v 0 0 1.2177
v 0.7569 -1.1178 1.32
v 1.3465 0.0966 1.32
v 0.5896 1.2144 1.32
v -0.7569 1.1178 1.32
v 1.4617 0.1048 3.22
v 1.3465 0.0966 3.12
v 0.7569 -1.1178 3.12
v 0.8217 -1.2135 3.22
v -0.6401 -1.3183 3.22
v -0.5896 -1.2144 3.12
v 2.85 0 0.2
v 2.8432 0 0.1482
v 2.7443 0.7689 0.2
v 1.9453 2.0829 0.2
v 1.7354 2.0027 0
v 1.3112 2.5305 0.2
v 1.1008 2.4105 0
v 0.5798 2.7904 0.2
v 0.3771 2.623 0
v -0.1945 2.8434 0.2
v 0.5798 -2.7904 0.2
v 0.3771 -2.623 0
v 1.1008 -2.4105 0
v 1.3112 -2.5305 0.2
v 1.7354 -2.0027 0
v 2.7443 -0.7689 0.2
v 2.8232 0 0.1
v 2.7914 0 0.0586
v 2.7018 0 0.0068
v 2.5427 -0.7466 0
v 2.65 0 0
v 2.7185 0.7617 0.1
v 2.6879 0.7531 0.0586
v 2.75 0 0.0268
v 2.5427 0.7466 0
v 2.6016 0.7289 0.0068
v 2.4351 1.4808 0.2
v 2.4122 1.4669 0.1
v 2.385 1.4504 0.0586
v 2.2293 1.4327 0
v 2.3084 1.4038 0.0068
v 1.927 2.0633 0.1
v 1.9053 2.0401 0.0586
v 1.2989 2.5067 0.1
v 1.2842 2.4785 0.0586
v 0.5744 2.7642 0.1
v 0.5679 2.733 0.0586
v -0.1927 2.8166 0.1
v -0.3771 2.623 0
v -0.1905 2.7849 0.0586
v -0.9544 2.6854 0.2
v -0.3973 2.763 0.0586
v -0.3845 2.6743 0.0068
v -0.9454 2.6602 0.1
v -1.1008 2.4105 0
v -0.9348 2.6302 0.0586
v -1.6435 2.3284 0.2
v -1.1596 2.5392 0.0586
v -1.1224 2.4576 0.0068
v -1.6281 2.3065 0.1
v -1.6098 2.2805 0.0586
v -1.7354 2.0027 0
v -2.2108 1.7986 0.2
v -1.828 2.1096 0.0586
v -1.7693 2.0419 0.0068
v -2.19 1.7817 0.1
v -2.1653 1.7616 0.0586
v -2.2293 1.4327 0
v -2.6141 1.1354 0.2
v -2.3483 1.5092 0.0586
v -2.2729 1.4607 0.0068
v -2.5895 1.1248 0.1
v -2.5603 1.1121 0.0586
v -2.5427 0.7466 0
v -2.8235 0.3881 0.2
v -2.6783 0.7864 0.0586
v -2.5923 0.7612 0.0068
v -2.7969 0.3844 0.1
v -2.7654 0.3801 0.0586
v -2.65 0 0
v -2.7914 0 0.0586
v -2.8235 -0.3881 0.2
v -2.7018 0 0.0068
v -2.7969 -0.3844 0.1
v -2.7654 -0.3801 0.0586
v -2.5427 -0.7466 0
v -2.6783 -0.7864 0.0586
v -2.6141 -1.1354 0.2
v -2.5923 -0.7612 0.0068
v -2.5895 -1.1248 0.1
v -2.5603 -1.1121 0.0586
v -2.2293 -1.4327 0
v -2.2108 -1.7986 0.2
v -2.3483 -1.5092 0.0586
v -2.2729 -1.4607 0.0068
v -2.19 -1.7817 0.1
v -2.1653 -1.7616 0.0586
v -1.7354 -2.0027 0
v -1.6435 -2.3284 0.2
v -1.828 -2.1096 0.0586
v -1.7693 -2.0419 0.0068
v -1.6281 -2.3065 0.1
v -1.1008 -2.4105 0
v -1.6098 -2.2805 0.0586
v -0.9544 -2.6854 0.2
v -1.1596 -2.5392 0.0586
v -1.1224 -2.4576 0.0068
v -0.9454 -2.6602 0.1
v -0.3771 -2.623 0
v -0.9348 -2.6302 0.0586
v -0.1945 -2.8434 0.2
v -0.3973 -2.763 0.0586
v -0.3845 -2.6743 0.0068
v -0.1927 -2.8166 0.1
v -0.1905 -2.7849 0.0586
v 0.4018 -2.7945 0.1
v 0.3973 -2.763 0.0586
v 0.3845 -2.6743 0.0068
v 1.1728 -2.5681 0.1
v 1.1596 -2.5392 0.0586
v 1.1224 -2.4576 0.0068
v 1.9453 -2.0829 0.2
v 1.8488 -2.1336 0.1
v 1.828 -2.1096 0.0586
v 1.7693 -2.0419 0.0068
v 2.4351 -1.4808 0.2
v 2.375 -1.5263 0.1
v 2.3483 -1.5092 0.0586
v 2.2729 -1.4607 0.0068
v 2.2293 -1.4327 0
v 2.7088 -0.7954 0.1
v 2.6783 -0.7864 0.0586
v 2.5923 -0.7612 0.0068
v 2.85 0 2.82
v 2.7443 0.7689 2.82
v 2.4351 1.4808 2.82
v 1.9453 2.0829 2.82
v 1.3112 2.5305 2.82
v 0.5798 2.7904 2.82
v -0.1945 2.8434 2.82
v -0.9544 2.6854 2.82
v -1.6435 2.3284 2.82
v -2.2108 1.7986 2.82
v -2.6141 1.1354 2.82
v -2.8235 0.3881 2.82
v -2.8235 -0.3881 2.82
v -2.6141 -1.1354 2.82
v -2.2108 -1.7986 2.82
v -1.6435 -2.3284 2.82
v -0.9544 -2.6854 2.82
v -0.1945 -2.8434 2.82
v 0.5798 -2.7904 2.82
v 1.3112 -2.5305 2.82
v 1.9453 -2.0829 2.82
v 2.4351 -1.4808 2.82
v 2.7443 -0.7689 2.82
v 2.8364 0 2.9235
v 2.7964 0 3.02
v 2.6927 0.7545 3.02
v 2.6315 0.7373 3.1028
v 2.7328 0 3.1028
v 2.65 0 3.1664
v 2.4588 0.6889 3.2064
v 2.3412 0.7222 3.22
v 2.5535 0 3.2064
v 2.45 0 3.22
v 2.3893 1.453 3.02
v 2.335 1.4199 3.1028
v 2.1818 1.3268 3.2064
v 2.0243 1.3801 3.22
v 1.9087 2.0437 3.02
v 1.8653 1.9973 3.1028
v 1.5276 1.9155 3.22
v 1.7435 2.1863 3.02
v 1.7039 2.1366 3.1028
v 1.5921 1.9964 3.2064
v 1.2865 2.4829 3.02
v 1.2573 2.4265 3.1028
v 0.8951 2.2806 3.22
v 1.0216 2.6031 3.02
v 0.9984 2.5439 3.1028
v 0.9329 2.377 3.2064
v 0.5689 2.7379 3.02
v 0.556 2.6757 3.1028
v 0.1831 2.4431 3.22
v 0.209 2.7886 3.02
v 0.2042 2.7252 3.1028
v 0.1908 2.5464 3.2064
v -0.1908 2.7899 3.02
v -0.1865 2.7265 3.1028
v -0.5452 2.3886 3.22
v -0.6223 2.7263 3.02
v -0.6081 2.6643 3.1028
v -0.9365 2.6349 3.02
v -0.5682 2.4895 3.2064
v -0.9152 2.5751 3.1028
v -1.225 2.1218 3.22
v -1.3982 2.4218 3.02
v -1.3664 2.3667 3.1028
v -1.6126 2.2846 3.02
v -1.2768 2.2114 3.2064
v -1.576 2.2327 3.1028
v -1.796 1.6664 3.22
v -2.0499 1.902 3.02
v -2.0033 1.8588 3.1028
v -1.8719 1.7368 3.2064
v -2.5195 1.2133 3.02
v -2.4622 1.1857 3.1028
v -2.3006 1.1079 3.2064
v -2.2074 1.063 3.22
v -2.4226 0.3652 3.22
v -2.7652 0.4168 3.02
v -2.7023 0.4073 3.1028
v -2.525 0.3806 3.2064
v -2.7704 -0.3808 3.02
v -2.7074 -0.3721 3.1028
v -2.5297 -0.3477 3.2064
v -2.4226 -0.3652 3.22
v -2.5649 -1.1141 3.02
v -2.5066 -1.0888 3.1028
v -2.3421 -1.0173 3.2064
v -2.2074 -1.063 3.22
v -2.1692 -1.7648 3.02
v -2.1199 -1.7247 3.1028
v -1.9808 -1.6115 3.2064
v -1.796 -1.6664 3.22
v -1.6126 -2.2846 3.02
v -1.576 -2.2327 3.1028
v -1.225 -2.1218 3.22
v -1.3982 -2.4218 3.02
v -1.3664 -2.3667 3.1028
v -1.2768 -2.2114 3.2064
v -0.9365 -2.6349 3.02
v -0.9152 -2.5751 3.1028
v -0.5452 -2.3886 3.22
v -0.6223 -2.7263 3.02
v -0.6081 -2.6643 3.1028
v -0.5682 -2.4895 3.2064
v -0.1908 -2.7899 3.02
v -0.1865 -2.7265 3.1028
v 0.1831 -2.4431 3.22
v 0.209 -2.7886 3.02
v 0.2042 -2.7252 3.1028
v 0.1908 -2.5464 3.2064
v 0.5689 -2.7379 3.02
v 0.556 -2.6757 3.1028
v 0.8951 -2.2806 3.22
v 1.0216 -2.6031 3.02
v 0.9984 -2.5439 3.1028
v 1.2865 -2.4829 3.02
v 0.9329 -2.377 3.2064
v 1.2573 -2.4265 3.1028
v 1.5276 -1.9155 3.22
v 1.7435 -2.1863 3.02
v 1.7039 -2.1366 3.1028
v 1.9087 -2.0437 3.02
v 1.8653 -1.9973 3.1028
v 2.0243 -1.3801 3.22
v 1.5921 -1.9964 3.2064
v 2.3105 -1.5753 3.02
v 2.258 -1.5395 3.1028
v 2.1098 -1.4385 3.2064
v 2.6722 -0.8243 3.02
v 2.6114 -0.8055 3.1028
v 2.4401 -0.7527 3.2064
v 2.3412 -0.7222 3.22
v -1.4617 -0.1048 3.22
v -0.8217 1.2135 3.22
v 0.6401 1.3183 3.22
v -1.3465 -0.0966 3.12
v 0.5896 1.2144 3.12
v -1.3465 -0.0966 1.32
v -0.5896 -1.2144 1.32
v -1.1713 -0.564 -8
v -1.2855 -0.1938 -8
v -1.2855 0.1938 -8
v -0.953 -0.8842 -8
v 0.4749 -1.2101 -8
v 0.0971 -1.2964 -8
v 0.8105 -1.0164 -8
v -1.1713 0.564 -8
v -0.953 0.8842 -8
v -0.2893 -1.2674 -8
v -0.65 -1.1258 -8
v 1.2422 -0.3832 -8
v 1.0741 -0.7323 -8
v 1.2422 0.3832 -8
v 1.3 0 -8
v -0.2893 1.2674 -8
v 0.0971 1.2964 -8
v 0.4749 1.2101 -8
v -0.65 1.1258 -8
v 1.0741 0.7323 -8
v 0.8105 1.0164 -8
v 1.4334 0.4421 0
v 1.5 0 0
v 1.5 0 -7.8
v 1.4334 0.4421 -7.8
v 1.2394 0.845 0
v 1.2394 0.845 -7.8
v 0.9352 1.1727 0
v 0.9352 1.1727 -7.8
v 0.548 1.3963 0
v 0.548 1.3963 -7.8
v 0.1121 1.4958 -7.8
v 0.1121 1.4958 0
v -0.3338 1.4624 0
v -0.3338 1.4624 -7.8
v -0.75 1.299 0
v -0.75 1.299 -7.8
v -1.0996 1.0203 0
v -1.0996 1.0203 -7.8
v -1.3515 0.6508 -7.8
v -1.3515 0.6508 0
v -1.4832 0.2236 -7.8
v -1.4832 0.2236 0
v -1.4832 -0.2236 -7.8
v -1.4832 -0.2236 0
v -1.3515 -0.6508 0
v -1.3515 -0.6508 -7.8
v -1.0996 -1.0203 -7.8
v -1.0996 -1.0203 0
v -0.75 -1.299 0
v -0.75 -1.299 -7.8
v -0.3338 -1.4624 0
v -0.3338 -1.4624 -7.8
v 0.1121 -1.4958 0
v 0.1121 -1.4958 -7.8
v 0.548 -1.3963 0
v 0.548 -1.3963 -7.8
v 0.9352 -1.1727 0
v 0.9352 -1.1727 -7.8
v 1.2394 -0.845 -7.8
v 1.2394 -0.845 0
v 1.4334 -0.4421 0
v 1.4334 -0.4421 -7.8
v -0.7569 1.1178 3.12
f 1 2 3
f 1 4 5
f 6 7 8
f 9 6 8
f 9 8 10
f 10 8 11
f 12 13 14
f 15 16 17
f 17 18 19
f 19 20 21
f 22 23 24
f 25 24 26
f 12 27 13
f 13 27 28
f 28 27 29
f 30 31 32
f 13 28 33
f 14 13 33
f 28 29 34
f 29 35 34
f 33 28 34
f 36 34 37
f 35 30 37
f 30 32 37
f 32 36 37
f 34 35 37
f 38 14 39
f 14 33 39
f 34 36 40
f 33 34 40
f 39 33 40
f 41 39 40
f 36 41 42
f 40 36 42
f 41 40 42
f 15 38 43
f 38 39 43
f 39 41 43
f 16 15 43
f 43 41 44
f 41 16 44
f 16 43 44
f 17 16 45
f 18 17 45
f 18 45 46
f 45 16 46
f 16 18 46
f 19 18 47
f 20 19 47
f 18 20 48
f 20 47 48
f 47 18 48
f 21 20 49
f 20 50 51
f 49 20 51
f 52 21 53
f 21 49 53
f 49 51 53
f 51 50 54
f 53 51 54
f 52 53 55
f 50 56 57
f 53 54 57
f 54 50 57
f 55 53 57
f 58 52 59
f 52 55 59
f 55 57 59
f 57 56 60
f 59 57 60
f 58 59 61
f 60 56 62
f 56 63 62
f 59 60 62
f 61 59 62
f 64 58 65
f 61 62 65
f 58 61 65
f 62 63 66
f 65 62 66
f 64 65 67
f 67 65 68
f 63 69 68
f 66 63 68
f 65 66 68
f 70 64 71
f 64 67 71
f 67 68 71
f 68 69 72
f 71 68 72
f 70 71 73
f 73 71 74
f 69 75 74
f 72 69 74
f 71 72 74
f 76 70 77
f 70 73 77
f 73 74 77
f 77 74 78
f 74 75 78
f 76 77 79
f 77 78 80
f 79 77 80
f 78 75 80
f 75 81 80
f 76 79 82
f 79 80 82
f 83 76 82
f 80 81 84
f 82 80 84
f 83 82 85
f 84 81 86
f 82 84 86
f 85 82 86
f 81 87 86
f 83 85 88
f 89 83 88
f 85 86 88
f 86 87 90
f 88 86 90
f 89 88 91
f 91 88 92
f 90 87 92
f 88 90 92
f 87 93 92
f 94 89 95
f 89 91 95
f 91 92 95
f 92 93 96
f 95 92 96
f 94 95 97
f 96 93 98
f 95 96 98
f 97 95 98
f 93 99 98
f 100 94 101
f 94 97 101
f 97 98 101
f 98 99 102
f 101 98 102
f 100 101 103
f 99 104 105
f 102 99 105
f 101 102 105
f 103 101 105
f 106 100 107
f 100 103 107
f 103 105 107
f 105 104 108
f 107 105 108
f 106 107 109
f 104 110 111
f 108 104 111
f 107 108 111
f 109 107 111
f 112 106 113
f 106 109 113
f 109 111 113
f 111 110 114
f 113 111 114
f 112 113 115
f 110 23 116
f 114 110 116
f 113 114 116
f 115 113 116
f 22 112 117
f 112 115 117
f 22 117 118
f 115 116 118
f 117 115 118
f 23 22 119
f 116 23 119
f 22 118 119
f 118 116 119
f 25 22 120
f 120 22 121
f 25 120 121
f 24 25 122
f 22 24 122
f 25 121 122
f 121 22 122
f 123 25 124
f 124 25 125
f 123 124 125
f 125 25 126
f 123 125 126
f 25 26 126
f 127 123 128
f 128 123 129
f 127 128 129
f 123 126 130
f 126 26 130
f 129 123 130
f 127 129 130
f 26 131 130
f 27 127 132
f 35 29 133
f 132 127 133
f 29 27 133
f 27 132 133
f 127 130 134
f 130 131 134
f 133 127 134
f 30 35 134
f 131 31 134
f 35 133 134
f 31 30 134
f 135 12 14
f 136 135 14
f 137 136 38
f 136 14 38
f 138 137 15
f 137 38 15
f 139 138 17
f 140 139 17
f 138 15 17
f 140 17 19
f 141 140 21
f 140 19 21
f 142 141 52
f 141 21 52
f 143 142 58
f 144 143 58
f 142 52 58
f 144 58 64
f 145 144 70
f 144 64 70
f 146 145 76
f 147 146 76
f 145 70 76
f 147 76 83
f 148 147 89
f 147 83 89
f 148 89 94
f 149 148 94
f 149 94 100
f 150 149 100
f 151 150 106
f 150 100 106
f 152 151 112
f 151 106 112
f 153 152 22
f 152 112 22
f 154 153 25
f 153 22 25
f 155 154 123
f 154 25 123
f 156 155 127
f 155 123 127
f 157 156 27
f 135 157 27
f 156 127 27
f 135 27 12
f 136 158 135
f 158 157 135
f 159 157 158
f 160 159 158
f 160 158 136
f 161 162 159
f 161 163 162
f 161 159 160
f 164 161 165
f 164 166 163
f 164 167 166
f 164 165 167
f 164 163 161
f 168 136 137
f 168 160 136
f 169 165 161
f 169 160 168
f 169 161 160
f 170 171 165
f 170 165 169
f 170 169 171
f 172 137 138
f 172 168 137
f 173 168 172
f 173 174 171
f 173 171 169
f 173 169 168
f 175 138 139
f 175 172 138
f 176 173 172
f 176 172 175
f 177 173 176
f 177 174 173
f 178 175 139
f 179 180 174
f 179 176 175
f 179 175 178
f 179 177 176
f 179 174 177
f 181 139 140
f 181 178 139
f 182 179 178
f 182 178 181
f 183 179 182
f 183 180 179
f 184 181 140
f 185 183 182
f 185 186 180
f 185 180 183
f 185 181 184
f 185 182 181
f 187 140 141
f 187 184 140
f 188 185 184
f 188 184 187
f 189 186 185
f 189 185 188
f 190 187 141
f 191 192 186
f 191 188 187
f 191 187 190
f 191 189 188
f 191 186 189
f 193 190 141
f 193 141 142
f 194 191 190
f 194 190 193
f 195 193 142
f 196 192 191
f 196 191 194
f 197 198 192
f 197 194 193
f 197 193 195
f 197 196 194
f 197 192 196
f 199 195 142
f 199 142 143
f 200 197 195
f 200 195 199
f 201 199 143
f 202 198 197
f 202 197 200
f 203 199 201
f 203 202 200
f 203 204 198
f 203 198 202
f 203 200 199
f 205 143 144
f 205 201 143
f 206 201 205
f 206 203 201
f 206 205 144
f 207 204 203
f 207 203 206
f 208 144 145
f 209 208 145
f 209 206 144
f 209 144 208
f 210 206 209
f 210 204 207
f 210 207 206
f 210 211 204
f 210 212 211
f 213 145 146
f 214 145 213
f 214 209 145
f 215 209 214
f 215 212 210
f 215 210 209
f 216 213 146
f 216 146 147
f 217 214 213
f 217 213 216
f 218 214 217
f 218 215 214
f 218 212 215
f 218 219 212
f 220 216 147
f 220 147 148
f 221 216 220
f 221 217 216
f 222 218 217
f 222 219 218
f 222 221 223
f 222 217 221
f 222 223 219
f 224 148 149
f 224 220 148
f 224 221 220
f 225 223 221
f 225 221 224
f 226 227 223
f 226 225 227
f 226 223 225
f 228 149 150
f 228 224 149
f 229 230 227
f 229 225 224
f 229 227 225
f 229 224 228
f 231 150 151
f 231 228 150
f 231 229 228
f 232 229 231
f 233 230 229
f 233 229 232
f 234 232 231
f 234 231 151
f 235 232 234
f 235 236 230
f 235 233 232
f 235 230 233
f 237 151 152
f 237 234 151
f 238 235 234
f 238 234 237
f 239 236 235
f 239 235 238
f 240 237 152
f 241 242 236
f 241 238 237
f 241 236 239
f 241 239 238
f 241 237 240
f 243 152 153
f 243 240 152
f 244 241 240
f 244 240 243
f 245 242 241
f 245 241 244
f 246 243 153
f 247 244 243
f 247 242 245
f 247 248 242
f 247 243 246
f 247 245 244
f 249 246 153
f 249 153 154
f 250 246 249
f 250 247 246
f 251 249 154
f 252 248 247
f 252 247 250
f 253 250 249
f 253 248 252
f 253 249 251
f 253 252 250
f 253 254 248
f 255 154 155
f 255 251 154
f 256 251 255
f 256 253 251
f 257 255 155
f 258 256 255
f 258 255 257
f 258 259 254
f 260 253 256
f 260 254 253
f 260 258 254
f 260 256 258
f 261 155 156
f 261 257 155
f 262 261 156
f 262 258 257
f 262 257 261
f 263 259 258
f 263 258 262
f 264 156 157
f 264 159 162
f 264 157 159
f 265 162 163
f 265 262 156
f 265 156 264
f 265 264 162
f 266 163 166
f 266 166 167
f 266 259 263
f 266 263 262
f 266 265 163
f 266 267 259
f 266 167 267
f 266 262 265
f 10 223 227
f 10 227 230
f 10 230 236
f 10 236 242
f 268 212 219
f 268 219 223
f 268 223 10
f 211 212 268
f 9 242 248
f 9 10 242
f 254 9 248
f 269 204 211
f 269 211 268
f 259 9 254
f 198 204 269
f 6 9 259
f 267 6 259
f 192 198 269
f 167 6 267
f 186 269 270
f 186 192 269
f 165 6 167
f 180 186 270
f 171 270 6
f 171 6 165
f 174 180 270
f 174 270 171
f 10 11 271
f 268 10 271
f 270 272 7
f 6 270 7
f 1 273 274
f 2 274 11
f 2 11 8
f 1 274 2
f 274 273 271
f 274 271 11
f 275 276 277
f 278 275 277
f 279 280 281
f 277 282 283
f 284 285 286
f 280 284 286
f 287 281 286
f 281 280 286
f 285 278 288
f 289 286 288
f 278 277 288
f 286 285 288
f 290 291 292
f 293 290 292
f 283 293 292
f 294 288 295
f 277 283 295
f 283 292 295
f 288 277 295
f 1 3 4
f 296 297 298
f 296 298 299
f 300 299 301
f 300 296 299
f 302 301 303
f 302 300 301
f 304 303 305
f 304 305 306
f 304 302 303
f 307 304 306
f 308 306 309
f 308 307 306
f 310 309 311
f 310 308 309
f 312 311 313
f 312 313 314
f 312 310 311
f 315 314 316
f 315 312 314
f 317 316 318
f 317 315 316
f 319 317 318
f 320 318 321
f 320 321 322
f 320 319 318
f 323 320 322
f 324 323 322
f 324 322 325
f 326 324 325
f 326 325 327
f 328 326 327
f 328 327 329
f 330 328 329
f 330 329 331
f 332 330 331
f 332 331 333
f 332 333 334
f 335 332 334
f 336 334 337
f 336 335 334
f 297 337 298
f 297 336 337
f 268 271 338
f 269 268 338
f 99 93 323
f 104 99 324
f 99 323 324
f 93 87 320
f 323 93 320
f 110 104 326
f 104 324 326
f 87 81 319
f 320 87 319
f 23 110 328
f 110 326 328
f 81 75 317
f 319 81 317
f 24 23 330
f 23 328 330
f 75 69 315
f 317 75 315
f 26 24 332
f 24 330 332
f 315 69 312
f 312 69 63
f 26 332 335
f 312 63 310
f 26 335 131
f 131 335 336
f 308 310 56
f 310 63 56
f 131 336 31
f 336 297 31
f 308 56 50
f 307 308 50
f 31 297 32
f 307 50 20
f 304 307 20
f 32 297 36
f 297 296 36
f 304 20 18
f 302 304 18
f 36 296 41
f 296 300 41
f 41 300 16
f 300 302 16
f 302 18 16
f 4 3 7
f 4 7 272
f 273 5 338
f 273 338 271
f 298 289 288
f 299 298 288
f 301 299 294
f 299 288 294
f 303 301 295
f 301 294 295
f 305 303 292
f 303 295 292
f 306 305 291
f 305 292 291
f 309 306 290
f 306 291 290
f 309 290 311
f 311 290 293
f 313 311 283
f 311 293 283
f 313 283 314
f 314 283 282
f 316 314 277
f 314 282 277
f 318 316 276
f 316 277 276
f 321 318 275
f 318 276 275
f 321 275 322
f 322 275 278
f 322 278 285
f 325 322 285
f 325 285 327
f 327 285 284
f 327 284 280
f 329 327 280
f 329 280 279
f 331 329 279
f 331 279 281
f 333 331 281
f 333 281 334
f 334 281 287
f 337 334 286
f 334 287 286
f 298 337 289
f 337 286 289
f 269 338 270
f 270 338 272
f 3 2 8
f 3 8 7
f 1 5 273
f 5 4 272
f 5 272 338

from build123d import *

# Parameters (mm, degrees)
F0_R     = 2.85
F0_R_2   = 1.5
F1_DEPTH = 3.22
F2_DEPTH = 8
F3_R     = 0.4
F4_R     = 0.2
F5_SIZE  = 0.2
F6_START = 1.32
F6_DEPTH = 23.68
F7_SIZE  = 0.1


# Not quite as in the source:
# - an extrude whose draft closes it to a point is written as a loft to that point


with BuildPart() as f1:
    # F0 (on Top) → F1 (new body)
    with BuildSketch(Plane.XY):
        Circle(F0_R)
        Circle(F0_R_2, mode=Mode.SUBTRACT)
        Circle(F0_R_2)
        Polygon((-1.3465408328, -0.0965804618), (-0.7569115498, 1.1178483376), (0.589629283, 1.2144287993), (1.3465408328, 0.0965804618), (0.7569115498, -1.1178483376), (-0.589629283, -1.2144287993), align=None, mode=Mode.SUBTRACT)
        Polygon((0.589629283, 1.2144287993), (-0.7569115498, 1.1178483376), (-1.3465408328, -0.0965804618), (-0.589629283, -1.2144287993), (0.7569115498, -1.1178483376), (1.3465408328, 0.0965804618), align=None)
    extrude(amount=F1_DEPTH)

    # F0 (on Top) → F2 (join)
    with BuildSketch(Plane.XY):
        Circle(F0_R_2)
        Polygon((-1.3465408328, -0.0965804618), (-0.7569115498, 1.1178483376), (0.589629283, 1.2144287993), (1.3465408328, 0.0965804618), (0.7569115498, -1.1178483376), (-0.589629283, -1.2144287993), align=None, mode=Mode.SUBTRACT)
        Polygon((0.589629283, 1.2144287993), (-0.7569115498, 1.1178483376), (-1.3465408328, -0.0965804618), (-0.589629283, -1.2144287993), (0.7569115498, -1.1178483376), (1.3465408328, 0.0965804618), align=None)
    extrude(amount=-F2_DEPTH)

    # F3
    f3_edges = [f1.edges().sort_by_distance(p)[0] for p in [
        (-2.85, 0, 3.22),
    ]]
    fillet(f3_edges, radius=F3_R)

    # F4
    f4_edges = [f1.edges().sort_by_distance(p)[0] for p in [
        (-2.85, 0, 0),
    ]]
    fillet(f4_edges, radius=F4_R)

    # F5
    f5_edges = [f1.edges().sort_by_distance(p)[0] for p in [
        (-1.5, 0, -8),
    ]]
    chamfer(f5_edges, length=F5_SIZE)

    # F0 (on Top) → F6 (cut)
    with BuildSketch(Plane.XY.offset(F6_START)):
        Polygon((0.589629283, 1.2144287993), (-0.7569115498, 1.1178483376), (-1.3465408328, -0.0965804618), (-0.589629283, -1.2144287993), (0.7569115498, -1.1178483376), (1.3465408328, 0.0965804618), align=None)
    extrude(amount=F6_DEPTH, mode=Mode.SUBTRACT)

    # F7
    f7_edges = [f1.edges().sort_by_distance(p)[0] for p in [
        (-1.051726, 0.510634, 3.22),
        (-0.083641, 1.166139, 3.22),
        (0.968085, 0.655505, 3.22),
        (1.051726, -0.510634, 3.22),
        (0.083641, -1.166139, 3.22),
        (-0.968085, -0.655505, 3.22),
    ]]
    chamfer(f7_edges, length=F7_SIZE)

    # F6_face (on face) → F8 section 0
    with BuildSketch(Plane.XY.offset(1.32), mode=Mode.PRIVATE) as f8_s0:
        Polygon((1.3465408328, 0.0965804618), (0.589629283, 1.2144287993), (-0.7569115498, 1.1178483376), (-1.3465408328, -0.0965804618), (-0.589629283, -1.2144287993), (0.7569115498, -1.1178483376), align=None)
    loft([f8_s0.sketch, Vertex(0, 0, 1.217714003)], ruled=True, mode=Mode.SUBTRACT)


solid = f1.part
